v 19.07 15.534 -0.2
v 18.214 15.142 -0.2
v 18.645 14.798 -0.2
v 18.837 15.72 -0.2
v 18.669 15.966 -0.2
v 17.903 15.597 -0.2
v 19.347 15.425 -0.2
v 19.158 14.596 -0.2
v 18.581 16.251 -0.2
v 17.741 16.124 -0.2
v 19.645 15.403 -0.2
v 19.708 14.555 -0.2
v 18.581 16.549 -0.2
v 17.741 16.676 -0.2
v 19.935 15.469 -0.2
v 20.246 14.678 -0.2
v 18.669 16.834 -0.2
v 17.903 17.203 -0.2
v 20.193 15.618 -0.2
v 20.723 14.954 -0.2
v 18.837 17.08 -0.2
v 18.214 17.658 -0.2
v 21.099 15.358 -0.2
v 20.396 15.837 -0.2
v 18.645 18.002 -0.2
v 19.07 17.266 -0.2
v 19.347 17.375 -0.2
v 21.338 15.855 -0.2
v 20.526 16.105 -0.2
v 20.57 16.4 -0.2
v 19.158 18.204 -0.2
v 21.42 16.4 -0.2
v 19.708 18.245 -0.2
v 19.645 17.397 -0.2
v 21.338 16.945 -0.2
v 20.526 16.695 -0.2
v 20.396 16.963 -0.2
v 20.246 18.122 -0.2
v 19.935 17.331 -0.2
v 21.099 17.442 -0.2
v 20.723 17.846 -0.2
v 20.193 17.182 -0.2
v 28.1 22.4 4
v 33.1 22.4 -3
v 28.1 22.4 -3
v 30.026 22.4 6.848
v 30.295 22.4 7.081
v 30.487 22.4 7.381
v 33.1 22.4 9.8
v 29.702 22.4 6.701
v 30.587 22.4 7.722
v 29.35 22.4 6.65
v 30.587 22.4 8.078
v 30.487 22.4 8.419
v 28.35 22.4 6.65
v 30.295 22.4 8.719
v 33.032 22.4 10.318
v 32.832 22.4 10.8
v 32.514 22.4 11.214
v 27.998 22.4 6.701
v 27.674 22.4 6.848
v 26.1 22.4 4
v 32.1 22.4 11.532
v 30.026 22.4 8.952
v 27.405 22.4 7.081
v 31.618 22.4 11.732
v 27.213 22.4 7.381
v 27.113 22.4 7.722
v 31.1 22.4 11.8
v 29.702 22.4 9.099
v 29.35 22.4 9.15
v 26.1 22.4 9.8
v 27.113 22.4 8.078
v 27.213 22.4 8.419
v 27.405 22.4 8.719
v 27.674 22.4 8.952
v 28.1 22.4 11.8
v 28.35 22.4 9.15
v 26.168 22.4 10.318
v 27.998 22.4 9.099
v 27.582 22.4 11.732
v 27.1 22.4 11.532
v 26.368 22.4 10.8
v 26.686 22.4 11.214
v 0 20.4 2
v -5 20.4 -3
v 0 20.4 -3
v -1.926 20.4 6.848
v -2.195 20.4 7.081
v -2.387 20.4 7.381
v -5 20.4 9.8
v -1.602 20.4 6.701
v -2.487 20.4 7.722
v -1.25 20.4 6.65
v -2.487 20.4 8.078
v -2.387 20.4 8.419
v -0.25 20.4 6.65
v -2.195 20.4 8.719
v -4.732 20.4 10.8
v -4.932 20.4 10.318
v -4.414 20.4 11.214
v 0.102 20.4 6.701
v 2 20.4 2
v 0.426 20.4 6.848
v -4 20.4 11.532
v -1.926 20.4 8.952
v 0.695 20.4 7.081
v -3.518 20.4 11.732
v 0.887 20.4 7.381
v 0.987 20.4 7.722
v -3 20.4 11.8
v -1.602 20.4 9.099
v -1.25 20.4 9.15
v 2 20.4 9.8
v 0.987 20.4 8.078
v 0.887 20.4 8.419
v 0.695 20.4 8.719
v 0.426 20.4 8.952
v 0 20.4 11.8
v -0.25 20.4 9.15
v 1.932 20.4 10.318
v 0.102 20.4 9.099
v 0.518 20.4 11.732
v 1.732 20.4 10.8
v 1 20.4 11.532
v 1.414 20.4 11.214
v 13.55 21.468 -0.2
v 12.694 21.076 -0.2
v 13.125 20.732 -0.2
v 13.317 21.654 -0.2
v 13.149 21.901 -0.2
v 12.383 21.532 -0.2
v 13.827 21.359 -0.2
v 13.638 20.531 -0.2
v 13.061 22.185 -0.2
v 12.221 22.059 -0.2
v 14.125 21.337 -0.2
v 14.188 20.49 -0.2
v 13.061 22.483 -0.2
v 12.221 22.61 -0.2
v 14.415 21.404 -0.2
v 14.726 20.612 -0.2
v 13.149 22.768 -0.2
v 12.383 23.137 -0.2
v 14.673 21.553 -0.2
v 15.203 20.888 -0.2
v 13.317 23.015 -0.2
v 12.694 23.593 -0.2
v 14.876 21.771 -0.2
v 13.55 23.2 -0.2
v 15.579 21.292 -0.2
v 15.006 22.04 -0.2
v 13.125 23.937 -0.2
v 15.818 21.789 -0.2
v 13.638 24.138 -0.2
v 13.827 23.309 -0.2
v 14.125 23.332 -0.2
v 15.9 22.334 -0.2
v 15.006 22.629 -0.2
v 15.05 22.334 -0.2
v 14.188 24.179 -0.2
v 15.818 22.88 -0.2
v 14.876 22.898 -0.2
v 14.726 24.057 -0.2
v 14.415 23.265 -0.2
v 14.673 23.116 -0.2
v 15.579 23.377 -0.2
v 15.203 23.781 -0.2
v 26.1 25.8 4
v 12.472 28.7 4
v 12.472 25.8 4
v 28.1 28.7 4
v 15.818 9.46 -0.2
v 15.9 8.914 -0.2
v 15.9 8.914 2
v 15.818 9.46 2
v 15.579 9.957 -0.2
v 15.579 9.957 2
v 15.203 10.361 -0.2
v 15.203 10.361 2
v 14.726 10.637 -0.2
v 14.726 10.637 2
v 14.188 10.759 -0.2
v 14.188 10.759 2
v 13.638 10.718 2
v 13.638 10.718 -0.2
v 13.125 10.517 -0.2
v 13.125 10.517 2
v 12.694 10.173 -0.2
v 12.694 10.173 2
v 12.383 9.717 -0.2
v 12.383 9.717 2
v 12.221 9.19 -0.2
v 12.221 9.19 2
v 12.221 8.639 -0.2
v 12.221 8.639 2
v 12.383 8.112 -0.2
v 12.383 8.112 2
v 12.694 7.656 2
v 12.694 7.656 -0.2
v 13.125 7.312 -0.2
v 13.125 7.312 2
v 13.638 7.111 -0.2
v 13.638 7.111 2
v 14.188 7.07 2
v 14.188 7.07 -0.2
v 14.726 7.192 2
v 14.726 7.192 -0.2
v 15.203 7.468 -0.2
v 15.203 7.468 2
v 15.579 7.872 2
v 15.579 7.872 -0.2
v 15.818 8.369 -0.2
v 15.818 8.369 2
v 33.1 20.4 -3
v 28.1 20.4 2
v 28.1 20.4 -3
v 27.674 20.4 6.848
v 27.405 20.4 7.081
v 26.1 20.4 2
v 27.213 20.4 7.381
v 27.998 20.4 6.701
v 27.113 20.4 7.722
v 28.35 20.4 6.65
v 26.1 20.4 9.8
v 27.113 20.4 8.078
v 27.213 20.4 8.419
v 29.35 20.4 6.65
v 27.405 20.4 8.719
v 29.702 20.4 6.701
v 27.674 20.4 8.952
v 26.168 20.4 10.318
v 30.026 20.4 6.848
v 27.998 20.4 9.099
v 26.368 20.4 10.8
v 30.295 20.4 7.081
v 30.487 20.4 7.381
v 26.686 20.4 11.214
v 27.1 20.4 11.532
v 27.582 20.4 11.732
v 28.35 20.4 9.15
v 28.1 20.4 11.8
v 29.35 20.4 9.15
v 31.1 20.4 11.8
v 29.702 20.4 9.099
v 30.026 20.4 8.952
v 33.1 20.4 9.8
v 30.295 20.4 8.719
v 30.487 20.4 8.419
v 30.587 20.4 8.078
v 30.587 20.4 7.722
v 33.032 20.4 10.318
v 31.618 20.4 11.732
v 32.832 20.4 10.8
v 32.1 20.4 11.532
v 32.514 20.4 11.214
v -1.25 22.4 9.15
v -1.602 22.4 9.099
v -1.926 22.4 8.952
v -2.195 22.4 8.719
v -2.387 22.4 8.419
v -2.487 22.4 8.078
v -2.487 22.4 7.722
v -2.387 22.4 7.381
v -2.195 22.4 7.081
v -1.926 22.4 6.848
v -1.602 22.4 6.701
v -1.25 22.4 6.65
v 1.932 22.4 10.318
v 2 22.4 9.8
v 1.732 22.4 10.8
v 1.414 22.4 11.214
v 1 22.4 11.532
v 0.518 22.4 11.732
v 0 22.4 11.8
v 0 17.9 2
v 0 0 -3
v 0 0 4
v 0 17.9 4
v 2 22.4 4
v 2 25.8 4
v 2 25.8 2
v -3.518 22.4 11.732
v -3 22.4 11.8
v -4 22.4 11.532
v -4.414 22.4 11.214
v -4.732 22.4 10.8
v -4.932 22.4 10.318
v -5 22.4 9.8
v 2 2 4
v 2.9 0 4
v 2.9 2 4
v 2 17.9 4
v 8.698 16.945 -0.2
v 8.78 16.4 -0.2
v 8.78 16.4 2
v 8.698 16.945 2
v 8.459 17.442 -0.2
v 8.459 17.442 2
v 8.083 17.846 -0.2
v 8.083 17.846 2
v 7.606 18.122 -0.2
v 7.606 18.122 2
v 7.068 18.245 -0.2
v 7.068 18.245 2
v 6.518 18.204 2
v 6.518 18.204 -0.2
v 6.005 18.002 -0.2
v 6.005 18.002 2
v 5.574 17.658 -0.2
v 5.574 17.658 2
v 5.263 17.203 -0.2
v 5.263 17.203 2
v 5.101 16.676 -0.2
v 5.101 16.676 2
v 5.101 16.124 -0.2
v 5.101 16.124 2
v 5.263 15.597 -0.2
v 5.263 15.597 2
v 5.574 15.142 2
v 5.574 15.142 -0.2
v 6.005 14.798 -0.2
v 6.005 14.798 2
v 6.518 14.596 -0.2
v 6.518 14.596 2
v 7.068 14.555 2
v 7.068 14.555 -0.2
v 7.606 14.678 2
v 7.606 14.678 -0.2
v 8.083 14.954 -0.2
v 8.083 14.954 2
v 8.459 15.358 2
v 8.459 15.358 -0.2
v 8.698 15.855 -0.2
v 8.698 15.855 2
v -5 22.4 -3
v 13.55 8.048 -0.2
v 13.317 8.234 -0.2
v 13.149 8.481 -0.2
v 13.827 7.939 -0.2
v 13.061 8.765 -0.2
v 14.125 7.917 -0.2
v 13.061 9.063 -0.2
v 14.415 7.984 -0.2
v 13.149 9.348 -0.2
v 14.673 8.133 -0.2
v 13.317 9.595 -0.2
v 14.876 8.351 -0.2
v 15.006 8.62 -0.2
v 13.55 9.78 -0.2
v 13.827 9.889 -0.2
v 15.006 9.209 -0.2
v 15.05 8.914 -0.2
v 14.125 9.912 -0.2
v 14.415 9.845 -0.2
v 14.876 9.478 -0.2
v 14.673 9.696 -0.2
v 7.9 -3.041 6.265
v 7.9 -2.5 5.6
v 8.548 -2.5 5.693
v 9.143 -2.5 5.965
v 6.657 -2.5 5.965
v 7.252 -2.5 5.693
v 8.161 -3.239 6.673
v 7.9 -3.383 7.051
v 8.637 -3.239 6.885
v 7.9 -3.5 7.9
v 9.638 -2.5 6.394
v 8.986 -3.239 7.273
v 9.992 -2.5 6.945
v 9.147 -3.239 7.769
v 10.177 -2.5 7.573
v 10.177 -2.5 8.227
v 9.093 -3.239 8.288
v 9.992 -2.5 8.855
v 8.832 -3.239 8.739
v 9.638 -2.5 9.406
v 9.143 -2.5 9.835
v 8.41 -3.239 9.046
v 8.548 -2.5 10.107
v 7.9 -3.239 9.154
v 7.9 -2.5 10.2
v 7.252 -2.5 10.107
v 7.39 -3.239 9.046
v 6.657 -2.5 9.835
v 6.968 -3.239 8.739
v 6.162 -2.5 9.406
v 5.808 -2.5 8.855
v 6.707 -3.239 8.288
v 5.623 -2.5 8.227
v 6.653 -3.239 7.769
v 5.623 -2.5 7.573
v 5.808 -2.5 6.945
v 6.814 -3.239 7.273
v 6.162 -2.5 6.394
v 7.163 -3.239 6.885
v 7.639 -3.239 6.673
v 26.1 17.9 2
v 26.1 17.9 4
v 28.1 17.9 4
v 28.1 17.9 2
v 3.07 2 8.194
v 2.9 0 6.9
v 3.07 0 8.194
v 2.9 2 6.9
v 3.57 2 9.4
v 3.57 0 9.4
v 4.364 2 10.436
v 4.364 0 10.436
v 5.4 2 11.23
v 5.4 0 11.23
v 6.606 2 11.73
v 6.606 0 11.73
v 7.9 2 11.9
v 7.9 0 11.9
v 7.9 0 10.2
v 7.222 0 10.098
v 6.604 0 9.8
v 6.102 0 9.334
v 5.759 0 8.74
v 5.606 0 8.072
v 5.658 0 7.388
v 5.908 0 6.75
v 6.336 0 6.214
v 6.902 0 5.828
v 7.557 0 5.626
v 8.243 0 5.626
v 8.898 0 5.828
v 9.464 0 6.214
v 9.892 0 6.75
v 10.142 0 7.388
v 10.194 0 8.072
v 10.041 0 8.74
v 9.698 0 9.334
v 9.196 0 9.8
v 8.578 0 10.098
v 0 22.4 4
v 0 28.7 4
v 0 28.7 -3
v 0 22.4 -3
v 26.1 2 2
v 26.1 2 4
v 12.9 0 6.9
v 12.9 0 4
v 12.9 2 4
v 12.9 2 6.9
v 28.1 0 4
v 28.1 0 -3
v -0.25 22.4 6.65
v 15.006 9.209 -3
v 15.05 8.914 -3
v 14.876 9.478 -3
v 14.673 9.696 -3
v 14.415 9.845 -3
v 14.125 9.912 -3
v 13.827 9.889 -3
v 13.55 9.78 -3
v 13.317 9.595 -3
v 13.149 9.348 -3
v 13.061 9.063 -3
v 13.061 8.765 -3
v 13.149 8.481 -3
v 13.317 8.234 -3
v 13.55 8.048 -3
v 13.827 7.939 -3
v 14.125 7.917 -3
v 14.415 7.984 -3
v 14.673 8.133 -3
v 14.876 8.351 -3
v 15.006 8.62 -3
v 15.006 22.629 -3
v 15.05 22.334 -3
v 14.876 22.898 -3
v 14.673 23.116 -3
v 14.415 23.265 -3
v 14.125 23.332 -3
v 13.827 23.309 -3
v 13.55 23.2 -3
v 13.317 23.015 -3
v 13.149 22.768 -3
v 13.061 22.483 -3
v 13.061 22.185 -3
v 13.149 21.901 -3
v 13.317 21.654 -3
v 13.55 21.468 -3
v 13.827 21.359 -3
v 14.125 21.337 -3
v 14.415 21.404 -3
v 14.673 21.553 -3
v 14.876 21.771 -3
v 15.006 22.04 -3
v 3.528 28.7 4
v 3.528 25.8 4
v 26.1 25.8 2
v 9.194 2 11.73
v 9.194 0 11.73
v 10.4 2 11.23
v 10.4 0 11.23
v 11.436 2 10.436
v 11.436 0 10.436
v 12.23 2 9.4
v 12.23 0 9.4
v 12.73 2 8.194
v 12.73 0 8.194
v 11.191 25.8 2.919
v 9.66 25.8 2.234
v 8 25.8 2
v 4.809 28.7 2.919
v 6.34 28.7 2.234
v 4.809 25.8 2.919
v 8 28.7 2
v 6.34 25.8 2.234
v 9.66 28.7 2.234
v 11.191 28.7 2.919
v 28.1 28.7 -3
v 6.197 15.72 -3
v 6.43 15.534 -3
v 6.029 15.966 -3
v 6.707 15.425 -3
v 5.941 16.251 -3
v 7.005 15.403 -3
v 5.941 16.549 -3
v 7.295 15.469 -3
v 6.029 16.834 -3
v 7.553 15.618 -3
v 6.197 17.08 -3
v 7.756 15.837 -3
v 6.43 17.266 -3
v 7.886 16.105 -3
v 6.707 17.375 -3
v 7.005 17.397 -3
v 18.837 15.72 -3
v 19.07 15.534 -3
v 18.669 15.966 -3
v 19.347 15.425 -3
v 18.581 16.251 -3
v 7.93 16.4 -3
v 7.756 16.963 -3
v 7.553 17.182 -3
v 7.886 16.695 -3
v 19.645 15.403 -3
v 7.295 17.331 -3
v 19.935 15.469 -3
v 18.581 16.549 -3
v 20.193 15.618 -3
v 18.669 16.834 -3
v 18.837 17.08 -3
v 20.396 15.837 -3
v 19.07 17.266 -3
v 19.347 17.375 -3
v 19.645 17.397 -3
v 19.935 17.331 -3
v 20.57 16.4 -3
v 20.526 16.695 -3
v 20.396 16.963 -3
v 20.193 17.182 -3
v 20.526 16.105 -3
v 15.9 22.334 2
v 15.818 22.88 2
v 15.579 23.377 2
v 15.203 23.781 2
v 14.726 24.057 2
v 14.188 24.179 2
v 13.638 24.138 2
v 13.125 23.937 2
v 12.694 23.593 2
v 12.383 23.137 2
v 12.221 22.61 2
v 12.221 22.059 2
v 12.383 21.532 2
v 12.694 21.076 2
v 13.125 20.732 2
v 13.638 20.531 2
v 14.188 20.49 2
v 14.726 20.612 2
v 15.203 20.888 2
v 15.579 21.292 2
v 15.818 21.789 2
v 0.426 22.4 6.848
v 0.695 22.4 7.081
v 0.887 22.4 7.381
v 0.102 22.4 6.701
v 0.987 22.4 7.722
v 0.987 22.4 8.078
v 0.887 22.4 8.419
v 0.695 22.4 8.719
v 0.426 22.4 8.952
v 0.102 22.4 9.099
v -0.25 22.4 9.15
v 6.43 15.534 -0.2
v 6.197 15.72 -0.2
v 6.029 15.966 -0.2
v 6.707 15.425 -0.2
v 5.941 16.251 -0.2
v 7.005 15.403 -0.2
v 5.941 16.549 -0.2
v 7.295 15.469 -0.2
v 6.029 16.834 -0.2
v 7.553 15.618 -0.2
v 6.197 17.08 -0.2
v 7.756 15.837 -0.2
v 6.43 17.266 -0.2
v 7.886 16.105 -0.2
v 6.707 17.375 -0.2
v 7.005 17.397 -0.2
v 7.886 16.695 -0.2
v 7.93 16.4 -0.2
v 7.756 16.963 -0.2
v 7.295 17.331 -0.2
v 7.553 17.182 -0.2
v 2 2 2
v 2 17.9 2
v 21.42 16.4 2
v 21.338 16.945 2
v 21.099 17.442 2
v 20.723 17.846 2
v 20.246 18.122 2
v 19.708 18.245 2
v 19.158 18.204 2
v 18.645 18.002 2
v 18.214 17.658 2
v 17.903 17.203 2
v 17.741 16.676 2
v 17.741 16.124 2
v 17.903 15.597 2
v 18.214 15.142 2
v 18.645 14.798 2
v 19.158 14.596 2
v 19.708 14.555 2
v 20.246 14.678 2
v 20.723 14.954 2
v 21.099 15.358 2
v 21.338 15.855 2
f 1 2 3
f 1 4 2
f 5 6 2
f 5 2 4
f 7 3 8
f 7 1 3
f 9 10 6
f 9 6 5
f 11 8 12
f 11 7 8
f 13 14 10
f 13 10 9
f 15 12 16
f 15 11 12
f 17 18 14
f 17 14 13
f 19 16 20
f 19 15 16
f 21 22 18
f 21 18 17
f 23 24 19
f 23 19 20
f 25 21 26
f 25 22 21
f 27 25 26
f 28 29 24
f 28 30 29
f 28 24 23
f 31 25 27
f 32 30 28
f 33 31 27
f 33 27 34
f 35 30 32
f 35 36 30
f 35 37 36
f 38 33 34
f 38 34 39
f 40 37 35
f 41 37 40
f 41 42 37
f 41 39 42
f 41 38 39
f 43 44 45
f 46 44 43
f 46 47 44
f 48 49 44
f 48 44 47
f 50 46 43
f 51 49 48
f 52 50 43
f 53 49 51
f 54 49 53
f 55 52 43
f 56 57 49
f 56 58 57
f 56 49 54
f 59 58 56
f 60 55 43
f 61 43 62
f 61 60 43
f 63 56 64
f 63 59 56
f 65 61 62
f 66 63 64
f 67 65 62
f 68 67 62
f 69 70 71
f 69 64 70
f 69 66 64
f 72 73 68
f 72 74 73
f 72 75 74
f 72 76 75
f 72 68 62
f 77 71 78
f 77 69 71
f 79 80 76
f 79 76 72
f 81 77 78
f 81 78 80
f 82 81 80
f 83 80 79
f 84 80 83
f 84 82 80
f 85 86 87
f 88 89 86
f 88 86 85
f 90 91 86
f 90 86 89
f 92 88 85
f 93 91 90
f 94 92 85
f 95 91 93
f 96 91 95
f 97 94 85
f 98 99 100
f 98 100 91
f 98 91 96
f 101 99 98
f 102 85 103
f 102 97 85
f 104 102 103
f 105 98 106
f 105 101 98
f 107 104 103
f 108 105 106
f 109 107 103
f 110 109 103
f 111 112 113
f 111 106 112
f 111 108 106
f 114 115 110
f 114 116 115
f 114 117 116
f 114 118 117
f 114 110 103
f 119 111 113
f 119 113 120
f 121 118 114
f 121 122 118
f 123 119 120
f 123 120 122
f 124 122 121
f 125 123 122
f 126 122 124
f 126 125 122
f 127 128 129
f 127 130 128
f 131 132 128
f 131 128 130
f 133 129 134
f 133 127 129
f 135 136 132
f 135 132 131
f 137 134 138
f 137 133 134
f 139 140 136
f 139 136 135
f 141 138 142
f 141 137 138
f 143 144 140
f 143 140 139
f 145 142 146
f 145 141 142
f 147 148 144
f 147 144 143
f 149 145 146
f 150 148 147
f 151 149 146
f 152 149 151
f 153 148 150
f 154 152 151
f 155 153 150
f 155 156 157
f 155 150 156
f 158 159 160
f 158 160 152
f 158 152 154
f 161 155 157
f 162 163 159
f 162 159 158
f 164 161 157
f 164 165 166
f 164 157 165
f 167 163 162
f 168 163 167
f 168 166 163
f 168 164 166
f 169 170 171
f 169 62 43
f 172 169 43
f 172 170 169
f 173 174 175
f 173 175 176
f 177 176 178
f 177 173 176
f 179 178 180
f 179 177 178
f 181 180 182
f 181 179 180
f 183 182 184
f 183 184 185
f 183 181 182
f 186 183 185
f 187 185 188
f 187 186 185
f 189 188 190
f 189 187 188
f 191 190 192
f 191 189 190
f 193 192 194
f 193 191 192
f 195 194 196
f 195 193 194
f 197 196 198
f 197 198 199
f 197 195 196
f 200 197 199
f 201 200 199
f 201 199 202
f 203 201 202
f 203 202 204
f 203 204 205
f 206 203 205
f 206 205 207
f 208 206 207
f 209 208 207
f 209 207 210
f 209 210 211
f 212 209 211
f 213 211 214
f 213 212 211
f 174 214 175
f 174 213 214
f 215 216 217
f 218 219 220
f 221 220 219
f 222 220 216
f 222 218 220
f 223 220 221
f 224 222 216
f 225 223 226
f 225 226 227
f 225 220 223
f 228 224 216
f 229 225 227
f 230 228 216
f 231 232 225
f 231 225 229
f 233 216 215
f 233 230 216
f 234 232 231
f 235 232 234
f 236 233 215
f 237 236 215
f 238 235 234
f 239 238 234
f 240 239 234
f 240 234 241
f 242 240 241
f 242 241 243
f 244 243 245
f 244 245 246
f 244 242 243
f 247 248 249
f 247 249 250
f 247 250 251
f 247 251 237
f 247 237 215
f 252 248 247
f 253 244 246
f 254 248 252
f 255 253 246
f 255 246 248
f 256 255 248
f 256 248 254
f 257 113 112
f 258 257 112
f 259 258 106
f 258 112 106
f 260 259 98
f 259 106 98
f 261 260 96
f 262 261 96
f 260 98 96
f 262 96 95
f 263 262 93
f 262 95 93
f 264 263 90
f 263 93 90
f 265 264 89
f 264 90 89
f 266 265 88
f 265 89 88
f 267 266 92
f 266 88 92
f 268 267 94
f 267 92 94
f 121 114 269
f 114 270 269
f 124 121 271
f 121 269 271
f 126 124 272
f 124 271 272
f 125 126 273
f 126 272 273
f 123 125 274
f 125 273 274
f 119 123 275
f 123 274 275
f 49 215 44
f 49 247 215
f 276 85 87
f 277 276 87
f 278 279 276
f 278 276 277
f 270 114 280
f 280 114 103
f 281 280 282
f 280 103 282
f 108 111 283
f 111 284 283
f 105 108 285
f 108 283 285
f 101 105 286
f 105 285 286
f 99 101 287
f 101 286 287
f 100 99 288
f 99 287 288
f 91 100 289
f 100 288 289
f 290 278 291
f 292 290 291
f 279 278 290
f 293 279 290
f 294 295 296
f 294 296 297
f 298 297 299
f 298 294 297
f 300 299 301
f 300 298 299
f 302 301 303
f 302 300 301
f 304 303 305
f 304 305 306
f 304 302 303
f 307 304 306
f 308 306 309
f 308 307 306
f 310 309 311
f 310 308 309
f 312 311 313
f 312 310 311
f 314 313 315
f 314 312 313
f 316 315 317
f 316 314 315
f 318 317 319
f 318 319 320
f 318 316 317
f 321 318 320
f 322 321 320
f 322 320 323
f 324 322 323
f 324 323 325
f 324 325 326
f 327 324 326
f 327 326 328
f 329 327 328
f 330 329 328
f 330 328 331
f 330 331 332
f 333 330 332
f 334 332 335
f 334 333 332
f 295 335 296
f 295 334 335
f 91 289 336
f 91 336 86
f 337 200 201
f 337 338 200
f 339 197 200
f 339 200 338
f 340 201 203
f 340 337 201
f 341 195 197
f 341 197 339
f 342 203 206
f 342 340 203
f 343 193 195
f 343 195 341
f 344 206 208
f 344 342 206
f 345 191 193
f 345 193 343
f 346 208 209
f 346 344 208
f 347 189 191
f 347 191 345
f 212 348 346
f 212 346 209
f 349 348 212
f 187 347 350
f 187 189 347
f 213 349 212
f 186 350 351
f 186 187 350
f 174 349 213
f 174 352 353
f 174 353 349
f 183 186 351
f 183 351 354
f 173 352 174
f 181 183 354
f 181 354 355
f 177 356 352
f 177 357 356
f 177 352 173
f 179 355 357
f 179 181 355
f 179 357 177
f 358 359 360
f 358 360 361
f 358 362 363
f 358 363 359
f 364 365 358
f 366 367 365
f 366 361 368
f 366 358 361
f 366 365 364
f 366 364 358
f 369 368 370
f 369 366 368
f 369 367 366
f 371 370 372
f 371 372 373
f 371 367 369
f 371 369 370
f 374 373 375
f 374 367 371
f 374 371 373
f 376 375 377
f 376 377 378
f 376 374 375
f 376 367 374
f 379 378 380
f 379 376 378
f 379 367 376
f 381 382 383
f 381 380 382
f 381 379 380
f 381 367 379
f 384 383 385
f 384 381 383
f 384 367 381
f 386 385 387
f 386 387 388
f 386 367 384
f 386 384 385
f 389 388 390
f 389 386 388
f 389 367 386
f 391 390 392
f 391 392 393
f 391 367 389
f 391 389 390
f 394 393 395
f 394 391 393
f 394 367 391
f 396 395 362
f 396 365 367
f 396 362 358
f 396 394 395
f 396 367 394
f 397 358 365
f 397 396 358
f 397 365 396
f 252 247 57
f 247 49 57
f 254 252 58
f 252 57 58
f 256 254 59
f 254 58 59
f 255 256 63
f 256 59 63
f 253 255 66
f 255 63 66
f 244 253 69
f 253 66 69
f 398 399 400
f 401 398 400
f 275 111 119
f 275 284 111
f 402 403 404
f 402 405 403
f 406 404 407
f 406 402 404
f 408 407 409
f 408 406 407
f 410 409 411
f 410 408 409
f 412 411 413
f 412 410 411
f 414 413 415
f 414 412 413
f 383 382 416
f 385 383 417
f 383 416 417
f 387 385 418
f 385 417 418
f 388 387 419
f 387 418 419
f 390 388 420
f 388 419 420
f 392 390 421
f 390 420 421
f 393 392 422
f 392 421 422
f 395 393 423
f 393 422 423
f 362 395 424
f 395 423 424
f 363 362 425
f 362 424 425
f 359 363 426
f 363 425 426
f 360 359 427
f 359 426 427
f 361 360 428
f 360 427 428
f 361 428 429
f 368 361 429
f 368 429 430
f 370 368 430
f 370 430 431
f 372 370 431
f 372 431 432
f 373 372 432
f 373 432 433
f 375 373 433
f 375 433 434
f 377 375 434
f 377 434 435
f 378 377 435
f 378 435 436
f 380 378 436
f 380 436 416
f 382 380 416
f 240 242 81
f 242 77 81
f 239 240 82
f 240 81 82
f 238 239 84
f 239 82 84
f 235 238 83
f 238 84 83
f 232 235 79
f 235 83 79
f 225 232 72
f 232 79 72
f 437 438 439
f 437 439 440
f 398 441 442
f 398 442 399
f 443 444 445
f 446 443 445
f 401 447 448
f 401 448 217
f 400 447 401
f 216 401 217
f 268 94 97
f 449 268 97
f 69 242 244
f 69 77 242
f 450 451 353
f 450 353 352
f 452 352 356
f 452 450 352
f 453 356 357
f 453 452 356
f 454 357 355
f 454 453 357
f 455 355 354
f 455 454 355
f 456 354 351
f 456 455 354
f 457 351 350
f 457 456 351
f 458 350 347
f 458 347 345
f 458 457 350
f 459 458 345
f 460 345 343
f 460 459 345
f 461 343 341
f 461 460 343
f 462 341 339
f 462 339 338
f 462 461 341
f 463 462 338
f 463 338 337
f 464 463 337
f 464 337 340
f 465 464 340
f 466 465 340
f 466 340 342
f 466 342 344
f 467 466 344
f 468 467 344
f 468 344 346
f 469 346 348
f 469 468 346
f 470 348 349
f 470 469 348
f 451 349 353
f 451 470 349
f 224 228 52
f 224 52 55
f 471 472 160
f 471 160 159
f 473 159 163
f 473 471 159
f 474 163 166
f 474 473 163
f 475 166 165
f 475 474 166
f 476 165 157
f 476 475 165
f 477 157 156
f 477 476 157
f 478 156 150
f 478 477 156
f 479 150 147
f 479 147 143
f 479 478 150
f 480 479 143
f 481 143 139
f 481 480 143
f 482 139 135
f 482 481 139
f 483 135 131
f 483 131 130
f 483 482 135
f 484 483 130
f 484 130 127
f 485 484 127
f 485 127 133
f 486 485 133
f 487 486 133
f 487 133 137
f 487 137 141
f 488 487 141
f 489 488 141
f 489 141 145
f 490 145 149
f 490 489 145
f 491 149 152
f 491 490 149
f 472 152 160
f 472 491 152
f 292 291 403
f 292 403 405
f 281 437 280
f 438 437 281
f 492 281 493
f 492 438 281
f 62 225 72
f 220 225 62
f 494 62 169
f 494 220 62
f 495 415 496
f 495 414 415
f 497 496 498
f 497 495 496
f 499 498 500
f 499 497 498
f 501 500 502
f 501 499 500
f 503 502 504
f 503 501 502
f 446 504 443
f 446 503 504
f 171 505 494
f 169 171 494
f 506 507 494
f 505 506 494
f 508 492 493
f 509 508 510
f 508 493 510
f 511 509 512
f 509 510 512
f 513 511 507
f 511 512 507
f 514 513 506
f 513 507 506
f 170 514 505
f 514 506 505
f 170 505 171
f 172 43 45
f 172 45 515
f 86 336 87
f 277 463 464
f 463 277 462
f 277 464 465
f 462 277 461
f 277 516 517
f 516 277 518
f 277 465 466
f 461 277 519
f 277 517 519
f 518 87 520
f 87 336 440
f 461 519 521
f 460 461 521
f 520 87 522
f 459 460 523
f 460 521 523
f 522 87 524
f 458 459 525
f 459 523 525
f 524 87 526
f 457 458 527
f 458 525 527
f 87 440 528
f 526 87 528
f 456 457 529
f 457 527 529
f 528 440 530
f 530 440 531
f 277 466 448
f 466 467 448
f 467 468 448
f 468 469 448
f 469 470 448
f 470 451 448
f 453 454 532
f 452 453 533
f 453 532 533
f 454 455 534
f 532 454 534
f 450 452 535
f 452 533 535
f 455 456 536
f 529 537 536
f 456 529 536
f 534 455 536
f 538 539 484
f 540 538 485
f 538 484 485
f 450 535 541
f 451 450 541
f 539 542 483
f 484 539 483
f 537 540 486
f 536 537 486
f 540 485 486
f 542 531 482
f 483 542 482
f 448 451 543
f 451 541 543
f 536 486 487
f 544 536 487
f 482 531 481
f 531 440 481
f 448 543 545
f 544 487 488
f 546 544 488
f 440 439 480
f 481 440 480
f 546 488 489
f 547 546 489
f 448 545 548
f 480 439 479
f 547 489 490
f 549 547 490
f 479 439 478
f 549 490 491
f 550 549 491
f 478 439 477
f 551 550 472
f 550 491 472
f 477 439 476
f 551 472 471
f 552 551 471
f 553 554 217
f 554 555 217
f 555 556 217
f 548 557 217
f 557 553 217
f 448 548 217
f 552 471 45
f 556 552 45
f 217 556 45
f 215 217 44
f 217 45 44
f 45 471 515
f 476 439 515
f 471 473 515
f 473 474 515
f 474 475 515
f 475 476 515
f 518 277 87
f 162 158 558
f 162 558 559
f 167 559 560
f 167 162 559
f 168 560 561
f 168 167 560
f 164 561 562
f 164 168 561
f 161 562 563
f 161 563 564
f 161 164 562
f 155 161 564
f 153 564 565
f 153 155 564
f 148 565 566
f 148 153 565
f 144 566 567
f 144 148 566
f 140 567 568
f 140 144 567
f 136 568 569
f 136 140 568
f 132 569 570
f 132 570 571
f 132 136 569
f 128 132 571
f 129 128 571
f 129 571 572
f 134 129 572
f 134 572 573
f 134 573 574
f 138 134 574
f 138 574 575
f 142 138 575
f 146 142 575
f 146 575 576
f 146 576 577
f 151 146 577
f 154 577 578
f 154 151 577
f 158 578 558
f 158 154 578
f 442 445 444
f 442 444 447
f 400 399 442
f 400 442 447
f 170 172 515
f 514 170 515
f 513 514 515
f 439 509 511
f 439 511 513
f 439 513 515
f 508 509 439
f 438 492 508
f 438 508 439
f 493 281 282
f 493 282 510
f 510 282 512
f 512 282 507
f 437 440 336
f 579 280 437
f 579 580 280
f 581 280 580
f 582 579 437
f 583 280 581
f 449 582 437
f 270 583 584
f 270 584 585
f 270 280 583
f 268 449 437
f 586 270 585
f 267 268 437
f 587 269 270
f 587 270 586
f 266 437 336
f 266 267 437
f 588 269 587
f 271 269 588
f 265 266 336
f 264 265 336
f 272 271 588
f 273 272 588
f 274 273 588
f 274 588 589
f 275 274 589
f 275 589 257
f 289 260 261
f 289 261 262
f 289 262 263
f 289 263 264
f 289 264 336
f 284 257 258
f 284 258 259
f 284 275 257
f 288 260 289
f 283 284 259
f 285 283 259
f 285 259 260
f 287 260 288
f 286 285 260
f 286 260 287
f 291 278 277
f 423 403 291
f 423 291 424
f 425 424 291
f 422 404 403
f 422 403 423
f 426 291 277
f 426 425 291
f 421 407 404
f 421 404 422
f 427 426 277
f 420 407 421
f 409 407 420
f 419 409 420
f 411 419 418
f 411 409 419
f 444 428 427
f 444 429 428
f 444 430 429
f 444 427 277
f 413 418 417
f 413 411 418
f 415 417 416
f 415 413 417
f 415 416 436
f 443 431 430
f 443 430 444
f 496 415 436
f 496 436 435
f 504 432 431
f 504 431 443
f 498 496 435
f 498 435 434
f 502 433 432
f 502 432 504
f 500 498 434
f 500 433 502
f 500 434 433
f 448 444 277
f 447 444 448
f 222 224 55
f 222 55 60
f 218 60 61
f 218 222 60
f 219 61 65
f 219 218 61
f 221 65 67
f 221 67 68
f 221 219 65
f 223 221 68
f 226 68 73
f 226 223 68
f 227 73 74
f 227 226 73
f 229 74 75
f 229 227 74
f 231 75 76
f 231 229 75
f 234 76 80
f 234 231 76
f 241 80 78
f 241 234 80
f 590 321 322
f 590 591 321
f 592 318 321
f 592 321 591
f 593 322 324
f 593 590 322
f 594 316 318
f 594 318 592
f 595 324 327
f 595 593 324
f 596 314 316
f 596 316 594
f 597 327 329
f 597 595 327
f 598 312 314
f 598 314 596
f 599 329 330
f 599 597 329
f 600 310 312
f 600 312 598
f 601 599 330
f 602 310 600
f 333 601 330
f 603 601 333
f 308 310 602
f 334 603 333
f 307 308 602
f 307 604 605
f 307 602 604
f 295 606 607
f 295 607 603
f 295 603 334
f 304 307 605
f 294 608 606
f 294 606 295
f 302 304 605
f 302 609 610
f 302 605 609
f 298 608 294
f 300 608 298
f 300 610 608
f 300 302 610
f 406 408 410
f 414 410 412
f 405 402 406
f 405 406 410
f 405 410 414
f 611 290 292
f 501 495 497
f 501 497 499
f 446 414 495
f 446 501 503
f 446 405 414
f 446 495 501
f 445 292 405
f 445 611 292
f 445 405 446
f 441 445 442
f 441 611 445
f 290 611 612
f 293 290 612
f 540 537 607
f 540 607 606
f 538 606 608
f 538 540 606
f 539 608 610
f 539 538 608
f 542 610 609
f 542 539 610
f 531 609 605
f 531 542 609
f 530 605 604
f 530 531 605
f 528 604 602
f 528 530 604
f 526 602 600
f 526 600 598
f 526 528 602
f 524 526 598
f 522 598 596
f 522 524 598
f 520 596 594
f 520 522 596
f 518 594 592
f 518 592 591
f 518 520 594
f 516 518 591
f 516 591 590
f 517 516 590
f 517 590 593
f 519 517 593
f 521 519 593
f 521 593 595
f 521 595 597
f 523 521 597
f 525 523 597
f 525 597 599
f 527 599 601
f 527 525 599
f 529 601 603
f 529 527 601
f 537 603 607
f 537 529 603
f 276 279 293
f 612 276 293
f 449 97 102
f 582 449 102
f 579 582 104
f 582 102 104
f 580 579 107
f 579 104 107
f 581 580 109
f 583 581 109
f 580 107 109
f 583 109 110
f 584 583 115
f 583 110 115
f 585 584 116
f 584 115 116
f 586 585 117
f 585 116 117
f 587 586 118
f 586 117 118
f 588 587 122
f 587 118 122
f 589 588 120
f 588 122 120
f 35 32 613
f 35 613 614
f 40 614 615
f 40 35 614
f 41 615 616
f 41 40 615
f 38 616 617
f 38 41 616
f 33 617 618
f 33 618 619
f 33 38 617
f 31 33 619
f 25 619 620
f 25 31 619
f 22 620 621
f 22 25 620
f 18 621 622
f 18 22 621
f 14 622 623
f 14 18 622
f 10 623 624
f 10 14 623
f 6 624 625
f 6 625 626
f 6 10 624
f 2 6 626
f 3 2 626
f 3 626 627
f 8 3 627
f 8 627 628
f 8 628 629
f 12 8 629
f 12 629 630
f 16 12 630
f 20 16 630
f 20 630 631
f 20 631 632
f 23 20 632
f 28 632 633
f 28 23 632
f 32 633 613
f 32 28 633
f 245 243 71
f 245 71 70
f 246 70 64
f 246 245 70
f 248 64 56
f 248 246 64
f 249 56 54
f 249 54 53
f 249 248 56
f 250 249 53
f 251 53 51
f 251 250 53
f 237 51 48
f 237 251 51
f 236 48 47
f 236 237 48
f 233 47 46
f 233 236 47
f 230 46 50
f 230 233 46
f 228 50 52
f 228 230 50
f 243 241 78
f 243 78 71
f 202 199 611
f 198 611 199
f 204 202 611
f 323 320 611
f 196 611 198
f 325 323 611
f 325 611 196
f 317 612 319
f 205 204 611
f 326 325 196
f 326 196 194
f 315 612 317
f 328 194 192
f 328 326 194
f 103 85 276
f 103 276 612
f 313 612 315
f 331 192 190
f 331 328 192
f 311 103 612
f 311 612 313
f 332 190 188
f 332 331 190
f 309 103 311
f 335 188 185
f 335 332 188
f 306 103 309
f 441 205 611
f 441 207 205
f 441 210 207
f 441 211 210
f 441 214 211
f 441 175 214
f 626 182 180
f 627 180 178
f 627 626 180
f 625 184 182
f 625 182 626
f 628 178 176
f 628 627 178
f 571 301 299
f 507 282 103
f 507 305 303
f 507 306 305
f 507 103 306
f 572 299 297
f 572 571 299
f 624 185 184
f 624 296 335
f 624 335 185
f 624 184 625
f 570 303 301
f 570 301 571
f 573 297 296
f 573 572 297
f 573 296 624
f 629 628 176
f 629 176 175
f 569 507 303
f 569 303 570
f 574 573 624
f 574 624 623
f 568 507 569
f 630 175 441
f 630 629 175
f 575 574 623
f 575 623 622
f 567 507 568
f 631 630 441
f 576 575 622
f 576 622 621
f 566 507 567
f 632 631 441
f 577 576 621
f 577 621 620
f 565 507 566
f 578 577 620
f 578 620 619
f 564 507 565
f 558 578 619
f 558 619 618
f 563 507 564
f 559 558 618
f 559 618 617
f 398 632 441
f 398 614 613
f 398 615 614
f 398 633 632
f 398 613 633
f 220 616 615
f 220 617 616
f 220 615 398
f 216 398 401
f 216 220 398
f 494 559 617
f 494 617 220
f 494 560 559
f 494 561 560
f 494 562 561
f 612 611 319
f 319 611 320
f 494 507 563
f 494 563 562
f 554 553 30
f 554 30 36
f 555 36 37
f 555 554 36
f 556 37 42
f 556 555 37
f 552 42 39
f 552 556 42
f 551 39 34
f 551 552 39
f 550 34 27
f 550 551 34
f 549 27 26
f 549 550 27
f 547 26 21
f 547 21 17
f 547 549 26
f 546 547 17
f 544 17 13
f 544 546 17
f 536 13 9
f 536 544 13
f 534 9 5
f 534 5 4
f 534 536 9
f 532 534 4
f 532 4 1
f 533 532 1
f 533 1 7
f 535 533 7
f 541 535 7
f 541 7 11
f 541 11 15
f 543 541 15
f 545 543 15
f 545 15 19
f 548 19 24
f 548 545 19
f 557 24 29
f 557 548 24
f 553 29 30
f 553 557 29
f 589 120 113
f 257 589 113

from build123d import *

# Parameters (mm, degrees)
SKETCH4_W                        = 24.1
SKETCH4_H                        = 23.8
BOSS_EXTRUDE2_DEPTH              = 2
SKETCH1_W                        = 28.1
SKETCH1_H                        = 28.7
SKETCH1_W_2                      = 24.1
SKETCH1_H_2                      = 23.8
BOSS_EXTRUDE3_DEPTH              = 4
SKETCH6_W                        = 2
SKETCH6_H                        = 2.5
CUT_EXTRUDE2_DEPTH               = 2
SKETCH8_W                        = 7
SKETCH8_H                        = 2
BOSS_EXTRUDE4_DEPTH              = 11.8
SKETCH11_R                       = 6
CUT_EXTRUDE4_DEPTH               = 4
SKETCH12_W                       = 10
SKETCH12_H                       = 2
BOSS_EXTRUDE5_DEPTH              = 7.9
FILLET9_R                        = 5
FILLET10_R                       = 5
SKETCH14_R                       = 2.3
BOSS_EXTRUDE6_DEPTH              = 2.5
DOME3_FACE_RADIUS                = 2.3
DOME3_HEIGHT                     = 1
FILLET11_R                       = 2
FILLET12_R                       = 2
FILLET13_R                       = 2
FILLET14_R                       = 2
BOSS_EXTRUDE7_DEPTH              = 3
SKETCH19_R                       = 0.3
CUT_EXTRUDE6_DEPTH               = 2
CBORE_START                      = -0.2
CBORE_FOR_M1_6_SHCS1_OUTLINE_R   = 1.85
CBORE_FOR_M1_6_SHCS1_DEPTH       = 2.2
CBORE_START_2                    = -3
CBORE_FOR_M1_6_SHCS1_2_OUTLINE_R = 1
CBORE_FOR_M1_6_SHCS1_2_DEPTH     = 2.8
CUT_EXTRUDE8_DEPTH               = 2


# Read off the part's stored shape, not the designer's step: CBORE for M1.6 SHCS1
with BuildPart() as part:
    # Sketch4 → Boss-Extrude2 (new body)
    with BuildSketch(Plane.XY):
        with Locations((14.05, 13.9)):
            Rectangle(SKETCH4_W, SKETCH4_H)
    extrude(amount=BOSS_EXTRUDE2_DEPTH)

    # Sketch1 → Boss-Extrude3 (add)
    with BuildSketch(Plane.XY):
        with Locations((14.05, 14.35)):
            Rectangle(SKETCH1_W, SKETCH1_H)
        with Locations((14.05, 13.9)):
            Rectangle(SKETCH1_W_2, SKETCH1_H_2, mode=Mode.SUBTRACT)
    extrude(amount=BOSS_EXTRUDE3_DEPTH)

    # Sketch6 → Cut-Extrude2 (cut)
    with BuildSketch(Plane.XY.offset(4)):
        with Locations((1, 19.15)):
            Rectangle(SKETCH6_W, SKETCH6_H)
        with Locations((27.1, 19.15)):
            Rectangle(SKETCH6_W, SKETCH6_H)
    extrude(amount=-CUT_EXTRUDE2_DEPTH, mode=Mode.SUBTRACT)

    # Sketch8 → Boss-Extrude4 (add)
    with BuildSketch(Plane.XY):
        with Locations((-1.5, 21.4)):
            Rectangle(SKETCH8_W, SKETCH8_H)
        with Locations((29.6, 21.4)):
            Rectangle(SKETCH8_W, SKETCH8_H)
    extrude(amount=BOSS_EXTRUDE4_DEPTH)

    # Sketch11 → Cut-Extrude4 (cut)
    with BuildSketch(Plane(origin=(0, 25.8, 0), x_dir=(-1, 0, 0), z_dir=(0, -1, 0))):
        with Locations((-8, -8)):
            Circle(SKETCH11_R)
    extrude(amount=-CUT_EXTRUDE4_DEPTH, mode=Mode.SUBTRACT)

    # Sketch12 → Boss-Extrude5 (add)
    with BuildSketch(Plane.XY.offset(4)):
        with Locations((7.9, 1)):
            Rectangle(SKETCH12_W, SKETCH12_H)
    extrude(amount=BOSS_EXTRUDE5_DEPTH)

    # Fillet9
    fillet9_edges = [part.edges().sort_by_distance(p)[0] for p in [
        (2.9, 1, 11.9),
    ]]
    fillet(fillet9_edges, radius=FILLET9_R)

    # Fillet10
    fillet10_edges = [part.edges().sort_by_distance(p)[0] for p in [
        (12.9, 1, 11.9),
    ]]
    fillet(fillet10_edges, radius=FILLET10_R - 0.0001)  # a hair under: the kernel refuses the full size

    # Sketch14 → Boss-Extrude6 (add)
    with BuildSketch(Plane(origin=(0, 0, 0), x_dir=(-1, 0, 0), z_dir=(0, -1, 0))):
        with Locations(Location((-7.9, -7.9, 0), (0, 0, 270))):
            Circle(SKETCH14_R)
    extrude(amount=BOSS_EXTRUDE6_DEPTH)

    # Dome3: a dome of height H over a round flat face of radius A is a cap of a sphere of radius (A * A + H * H) / (2 * H)
    dome3_r = (DOME3_FACE_RADIUS * DOME3_FACE_RADIUS + DOME3_HEIGHT * DOME3_HEIGHT) / (2 * DOME3_HEIGHT)
    dome3_base = Plane((7.9, -2.5, 7.9), z_dir=(0, -1, 0))
    with Locations(dome3_base.offset(DOME3_HEIGHT - dome3_r)):
        dome3_ball = Sphere(dome3_r, mode=Mode.PRIVATE)
    add(split(dome3_ball, bisect_by=dome3_base, keep=Keep.TOP, mode=Mode.PRIVATE))

    # Fillet11
    fillet11_edges = [part.edges().sort_by_distance(p)[0] for p in [
        (2, 21.4, 11.8),
    ]]
    fillet(fillet11_edges, radius=FILLET11_R)

    # Fillet12
    fillet12_edges = [part.edges().sort_by_distance(p)[0] for p in [
        (-5, 21.4, 11.8),
    ]]
    fillet(fillet12_edges, radius=FILLET12_R)

    # Fillet13
    fillet13_edges = [part.edges().sort_by_distance(p)[0] for p in [
        (33.1, 21.4, 11.8),
    ]]
    fillet(fillet13_edges, radius=FILLET13_R)

    # Fillet14
    fillet14_edges = [part.edges().sort_by_distance(p)[0] for p in [
        (26.1, 21.4, 11.8),
    ]]
    fillet(fillet14_edges, radius=FILLET14_R)

    # Sketch16 → Boss-Extrude7 (add)
    with BuildSketch(Plane.XY):
        Polygon((33.1, 22.4), (28.1, 22.4), (28.1, 28.7), (0, 28.7), (0, 22.4), (-5, 22.4), (-5, 20.4), (0, 20.4), (0, 0), (28.1, 0), (28.1, 20.4), (33.1, 20.4), align=None)
    extrude(amount=-BOSS_EXTRUDE7_DEPTH)

    # Sketch19 → Cut-Extrude6 (cut)
    with BuildSketch(Plane.XY):
        with Locations((19.57, 15.62440581)):
            Circle(SKETCH19_R)
        with Locations((13.25, 22.33440581)):
            Circle(SKETCH19_R)
        with Locations(Location((6.93, 15.62440581, 0), (0, 0, 180))):
            Circle(SKETCH19_R)
        with Locations(Location((13.25, 8.91440581, 0), (0, 0, 180))):
            Circle(SKETCH19_R)
    extrude(amount=CUT_EXTRUDE6_DEPTH, mode=Mode.SUBTRACT)

    # CBORE for M1.6 SHCS1 outline → CBORE for M1.6 SHCS1 (cut)
    with BuildSketch(Plane.XY.offset(CBORE_START)):
        with Locations((14.05, 8.91440581)):
            Circle(CBORE_FOR_M1_6_SHCS1_OUTLINE_R)
        with Locations((19.57, 16.4)):
            Circle(CBORE_FOR_M1_6_SHCS1_OUTLINE_R)
        with Locations((14.05, 22.33440581)):
            Circle(CBORE_FOR_M1_6_SHCS1_OUTLINE_R)
        with Locations((6.93, 16.4)):
            Circle(CBORE_FOR_M1_6_SHCS1_OUTLINE_R)
    extrude(amount=CBORE_FOR_M1_6_SHCS1_DEPTH, mode=Mode.SUBTRACT)

    # CBORE for M1.6 SHCS1 2 outline → CBORE for M1.6 SHCS1 2 (cut)
    with BuildSketch(Plane.XY.offset(CBORE_START_2)):
        with Locations((14.05, 8.91440581)):
            Circle(CBORE_FOR_M1_6_SHCS1_2_OUTLINE_R)
        with Locations((19.57, 16.4)):
            Circle(CBORE_FOR_M1_6_SHCS1_2_OUTLINE_R)
        with Locations((14.05, 22.33440581)):
            Circle(CBORE_FOR_M1_6_SHCS1_2_OUTLINE_R)
        with Locations((6.93, 16.4)):
            Circle(CBORE_FOR_M1_6_SHCS1_2_OUTLINE_R)
    extrude(amount=CBORE_FOR_M1_6_SHCS1_2_DEPTH, mode=Mode.SUBTRACT)

    # Sketch10 → Cut-Extrude8 (cut)
    with BuildSketch(Plane(origin=(0, 20.4, 0), x_dir=(-1, 0, 0), z_dir=(0, -1, 0))):
        with BuildLine():
            Line((-29.35, -6.65), (-28.35, -6.65))
            ThreePointArc((-28.35, -6.65), (-27.1, -7.9), (-28.35, -9.15))
            Line((-28.35, -9.15), (-29.35, -9.15))
            ThreePointArc((-29.35, -9.15), (-30.6, -7.9), (-29.35, -6.65))
        make_face()
        with BuildLine():
            Line((1.25, -6.65), (0.25, -6.65))
            ThreePointArc((0.25, -6.65), (-1, -7.9), (0.25, -9.15))
            Line((0.25, -9.15), (1.25, -9.15))
            ThreePointArc((1.25, -9.15), (2.5, -7.9), (1.25, -6.65))
        make_face()
    extrude(amount=-CUT_EXTRUDE8_DEPTH, mode=Mode.SUBTRACT)


solid = part.part
